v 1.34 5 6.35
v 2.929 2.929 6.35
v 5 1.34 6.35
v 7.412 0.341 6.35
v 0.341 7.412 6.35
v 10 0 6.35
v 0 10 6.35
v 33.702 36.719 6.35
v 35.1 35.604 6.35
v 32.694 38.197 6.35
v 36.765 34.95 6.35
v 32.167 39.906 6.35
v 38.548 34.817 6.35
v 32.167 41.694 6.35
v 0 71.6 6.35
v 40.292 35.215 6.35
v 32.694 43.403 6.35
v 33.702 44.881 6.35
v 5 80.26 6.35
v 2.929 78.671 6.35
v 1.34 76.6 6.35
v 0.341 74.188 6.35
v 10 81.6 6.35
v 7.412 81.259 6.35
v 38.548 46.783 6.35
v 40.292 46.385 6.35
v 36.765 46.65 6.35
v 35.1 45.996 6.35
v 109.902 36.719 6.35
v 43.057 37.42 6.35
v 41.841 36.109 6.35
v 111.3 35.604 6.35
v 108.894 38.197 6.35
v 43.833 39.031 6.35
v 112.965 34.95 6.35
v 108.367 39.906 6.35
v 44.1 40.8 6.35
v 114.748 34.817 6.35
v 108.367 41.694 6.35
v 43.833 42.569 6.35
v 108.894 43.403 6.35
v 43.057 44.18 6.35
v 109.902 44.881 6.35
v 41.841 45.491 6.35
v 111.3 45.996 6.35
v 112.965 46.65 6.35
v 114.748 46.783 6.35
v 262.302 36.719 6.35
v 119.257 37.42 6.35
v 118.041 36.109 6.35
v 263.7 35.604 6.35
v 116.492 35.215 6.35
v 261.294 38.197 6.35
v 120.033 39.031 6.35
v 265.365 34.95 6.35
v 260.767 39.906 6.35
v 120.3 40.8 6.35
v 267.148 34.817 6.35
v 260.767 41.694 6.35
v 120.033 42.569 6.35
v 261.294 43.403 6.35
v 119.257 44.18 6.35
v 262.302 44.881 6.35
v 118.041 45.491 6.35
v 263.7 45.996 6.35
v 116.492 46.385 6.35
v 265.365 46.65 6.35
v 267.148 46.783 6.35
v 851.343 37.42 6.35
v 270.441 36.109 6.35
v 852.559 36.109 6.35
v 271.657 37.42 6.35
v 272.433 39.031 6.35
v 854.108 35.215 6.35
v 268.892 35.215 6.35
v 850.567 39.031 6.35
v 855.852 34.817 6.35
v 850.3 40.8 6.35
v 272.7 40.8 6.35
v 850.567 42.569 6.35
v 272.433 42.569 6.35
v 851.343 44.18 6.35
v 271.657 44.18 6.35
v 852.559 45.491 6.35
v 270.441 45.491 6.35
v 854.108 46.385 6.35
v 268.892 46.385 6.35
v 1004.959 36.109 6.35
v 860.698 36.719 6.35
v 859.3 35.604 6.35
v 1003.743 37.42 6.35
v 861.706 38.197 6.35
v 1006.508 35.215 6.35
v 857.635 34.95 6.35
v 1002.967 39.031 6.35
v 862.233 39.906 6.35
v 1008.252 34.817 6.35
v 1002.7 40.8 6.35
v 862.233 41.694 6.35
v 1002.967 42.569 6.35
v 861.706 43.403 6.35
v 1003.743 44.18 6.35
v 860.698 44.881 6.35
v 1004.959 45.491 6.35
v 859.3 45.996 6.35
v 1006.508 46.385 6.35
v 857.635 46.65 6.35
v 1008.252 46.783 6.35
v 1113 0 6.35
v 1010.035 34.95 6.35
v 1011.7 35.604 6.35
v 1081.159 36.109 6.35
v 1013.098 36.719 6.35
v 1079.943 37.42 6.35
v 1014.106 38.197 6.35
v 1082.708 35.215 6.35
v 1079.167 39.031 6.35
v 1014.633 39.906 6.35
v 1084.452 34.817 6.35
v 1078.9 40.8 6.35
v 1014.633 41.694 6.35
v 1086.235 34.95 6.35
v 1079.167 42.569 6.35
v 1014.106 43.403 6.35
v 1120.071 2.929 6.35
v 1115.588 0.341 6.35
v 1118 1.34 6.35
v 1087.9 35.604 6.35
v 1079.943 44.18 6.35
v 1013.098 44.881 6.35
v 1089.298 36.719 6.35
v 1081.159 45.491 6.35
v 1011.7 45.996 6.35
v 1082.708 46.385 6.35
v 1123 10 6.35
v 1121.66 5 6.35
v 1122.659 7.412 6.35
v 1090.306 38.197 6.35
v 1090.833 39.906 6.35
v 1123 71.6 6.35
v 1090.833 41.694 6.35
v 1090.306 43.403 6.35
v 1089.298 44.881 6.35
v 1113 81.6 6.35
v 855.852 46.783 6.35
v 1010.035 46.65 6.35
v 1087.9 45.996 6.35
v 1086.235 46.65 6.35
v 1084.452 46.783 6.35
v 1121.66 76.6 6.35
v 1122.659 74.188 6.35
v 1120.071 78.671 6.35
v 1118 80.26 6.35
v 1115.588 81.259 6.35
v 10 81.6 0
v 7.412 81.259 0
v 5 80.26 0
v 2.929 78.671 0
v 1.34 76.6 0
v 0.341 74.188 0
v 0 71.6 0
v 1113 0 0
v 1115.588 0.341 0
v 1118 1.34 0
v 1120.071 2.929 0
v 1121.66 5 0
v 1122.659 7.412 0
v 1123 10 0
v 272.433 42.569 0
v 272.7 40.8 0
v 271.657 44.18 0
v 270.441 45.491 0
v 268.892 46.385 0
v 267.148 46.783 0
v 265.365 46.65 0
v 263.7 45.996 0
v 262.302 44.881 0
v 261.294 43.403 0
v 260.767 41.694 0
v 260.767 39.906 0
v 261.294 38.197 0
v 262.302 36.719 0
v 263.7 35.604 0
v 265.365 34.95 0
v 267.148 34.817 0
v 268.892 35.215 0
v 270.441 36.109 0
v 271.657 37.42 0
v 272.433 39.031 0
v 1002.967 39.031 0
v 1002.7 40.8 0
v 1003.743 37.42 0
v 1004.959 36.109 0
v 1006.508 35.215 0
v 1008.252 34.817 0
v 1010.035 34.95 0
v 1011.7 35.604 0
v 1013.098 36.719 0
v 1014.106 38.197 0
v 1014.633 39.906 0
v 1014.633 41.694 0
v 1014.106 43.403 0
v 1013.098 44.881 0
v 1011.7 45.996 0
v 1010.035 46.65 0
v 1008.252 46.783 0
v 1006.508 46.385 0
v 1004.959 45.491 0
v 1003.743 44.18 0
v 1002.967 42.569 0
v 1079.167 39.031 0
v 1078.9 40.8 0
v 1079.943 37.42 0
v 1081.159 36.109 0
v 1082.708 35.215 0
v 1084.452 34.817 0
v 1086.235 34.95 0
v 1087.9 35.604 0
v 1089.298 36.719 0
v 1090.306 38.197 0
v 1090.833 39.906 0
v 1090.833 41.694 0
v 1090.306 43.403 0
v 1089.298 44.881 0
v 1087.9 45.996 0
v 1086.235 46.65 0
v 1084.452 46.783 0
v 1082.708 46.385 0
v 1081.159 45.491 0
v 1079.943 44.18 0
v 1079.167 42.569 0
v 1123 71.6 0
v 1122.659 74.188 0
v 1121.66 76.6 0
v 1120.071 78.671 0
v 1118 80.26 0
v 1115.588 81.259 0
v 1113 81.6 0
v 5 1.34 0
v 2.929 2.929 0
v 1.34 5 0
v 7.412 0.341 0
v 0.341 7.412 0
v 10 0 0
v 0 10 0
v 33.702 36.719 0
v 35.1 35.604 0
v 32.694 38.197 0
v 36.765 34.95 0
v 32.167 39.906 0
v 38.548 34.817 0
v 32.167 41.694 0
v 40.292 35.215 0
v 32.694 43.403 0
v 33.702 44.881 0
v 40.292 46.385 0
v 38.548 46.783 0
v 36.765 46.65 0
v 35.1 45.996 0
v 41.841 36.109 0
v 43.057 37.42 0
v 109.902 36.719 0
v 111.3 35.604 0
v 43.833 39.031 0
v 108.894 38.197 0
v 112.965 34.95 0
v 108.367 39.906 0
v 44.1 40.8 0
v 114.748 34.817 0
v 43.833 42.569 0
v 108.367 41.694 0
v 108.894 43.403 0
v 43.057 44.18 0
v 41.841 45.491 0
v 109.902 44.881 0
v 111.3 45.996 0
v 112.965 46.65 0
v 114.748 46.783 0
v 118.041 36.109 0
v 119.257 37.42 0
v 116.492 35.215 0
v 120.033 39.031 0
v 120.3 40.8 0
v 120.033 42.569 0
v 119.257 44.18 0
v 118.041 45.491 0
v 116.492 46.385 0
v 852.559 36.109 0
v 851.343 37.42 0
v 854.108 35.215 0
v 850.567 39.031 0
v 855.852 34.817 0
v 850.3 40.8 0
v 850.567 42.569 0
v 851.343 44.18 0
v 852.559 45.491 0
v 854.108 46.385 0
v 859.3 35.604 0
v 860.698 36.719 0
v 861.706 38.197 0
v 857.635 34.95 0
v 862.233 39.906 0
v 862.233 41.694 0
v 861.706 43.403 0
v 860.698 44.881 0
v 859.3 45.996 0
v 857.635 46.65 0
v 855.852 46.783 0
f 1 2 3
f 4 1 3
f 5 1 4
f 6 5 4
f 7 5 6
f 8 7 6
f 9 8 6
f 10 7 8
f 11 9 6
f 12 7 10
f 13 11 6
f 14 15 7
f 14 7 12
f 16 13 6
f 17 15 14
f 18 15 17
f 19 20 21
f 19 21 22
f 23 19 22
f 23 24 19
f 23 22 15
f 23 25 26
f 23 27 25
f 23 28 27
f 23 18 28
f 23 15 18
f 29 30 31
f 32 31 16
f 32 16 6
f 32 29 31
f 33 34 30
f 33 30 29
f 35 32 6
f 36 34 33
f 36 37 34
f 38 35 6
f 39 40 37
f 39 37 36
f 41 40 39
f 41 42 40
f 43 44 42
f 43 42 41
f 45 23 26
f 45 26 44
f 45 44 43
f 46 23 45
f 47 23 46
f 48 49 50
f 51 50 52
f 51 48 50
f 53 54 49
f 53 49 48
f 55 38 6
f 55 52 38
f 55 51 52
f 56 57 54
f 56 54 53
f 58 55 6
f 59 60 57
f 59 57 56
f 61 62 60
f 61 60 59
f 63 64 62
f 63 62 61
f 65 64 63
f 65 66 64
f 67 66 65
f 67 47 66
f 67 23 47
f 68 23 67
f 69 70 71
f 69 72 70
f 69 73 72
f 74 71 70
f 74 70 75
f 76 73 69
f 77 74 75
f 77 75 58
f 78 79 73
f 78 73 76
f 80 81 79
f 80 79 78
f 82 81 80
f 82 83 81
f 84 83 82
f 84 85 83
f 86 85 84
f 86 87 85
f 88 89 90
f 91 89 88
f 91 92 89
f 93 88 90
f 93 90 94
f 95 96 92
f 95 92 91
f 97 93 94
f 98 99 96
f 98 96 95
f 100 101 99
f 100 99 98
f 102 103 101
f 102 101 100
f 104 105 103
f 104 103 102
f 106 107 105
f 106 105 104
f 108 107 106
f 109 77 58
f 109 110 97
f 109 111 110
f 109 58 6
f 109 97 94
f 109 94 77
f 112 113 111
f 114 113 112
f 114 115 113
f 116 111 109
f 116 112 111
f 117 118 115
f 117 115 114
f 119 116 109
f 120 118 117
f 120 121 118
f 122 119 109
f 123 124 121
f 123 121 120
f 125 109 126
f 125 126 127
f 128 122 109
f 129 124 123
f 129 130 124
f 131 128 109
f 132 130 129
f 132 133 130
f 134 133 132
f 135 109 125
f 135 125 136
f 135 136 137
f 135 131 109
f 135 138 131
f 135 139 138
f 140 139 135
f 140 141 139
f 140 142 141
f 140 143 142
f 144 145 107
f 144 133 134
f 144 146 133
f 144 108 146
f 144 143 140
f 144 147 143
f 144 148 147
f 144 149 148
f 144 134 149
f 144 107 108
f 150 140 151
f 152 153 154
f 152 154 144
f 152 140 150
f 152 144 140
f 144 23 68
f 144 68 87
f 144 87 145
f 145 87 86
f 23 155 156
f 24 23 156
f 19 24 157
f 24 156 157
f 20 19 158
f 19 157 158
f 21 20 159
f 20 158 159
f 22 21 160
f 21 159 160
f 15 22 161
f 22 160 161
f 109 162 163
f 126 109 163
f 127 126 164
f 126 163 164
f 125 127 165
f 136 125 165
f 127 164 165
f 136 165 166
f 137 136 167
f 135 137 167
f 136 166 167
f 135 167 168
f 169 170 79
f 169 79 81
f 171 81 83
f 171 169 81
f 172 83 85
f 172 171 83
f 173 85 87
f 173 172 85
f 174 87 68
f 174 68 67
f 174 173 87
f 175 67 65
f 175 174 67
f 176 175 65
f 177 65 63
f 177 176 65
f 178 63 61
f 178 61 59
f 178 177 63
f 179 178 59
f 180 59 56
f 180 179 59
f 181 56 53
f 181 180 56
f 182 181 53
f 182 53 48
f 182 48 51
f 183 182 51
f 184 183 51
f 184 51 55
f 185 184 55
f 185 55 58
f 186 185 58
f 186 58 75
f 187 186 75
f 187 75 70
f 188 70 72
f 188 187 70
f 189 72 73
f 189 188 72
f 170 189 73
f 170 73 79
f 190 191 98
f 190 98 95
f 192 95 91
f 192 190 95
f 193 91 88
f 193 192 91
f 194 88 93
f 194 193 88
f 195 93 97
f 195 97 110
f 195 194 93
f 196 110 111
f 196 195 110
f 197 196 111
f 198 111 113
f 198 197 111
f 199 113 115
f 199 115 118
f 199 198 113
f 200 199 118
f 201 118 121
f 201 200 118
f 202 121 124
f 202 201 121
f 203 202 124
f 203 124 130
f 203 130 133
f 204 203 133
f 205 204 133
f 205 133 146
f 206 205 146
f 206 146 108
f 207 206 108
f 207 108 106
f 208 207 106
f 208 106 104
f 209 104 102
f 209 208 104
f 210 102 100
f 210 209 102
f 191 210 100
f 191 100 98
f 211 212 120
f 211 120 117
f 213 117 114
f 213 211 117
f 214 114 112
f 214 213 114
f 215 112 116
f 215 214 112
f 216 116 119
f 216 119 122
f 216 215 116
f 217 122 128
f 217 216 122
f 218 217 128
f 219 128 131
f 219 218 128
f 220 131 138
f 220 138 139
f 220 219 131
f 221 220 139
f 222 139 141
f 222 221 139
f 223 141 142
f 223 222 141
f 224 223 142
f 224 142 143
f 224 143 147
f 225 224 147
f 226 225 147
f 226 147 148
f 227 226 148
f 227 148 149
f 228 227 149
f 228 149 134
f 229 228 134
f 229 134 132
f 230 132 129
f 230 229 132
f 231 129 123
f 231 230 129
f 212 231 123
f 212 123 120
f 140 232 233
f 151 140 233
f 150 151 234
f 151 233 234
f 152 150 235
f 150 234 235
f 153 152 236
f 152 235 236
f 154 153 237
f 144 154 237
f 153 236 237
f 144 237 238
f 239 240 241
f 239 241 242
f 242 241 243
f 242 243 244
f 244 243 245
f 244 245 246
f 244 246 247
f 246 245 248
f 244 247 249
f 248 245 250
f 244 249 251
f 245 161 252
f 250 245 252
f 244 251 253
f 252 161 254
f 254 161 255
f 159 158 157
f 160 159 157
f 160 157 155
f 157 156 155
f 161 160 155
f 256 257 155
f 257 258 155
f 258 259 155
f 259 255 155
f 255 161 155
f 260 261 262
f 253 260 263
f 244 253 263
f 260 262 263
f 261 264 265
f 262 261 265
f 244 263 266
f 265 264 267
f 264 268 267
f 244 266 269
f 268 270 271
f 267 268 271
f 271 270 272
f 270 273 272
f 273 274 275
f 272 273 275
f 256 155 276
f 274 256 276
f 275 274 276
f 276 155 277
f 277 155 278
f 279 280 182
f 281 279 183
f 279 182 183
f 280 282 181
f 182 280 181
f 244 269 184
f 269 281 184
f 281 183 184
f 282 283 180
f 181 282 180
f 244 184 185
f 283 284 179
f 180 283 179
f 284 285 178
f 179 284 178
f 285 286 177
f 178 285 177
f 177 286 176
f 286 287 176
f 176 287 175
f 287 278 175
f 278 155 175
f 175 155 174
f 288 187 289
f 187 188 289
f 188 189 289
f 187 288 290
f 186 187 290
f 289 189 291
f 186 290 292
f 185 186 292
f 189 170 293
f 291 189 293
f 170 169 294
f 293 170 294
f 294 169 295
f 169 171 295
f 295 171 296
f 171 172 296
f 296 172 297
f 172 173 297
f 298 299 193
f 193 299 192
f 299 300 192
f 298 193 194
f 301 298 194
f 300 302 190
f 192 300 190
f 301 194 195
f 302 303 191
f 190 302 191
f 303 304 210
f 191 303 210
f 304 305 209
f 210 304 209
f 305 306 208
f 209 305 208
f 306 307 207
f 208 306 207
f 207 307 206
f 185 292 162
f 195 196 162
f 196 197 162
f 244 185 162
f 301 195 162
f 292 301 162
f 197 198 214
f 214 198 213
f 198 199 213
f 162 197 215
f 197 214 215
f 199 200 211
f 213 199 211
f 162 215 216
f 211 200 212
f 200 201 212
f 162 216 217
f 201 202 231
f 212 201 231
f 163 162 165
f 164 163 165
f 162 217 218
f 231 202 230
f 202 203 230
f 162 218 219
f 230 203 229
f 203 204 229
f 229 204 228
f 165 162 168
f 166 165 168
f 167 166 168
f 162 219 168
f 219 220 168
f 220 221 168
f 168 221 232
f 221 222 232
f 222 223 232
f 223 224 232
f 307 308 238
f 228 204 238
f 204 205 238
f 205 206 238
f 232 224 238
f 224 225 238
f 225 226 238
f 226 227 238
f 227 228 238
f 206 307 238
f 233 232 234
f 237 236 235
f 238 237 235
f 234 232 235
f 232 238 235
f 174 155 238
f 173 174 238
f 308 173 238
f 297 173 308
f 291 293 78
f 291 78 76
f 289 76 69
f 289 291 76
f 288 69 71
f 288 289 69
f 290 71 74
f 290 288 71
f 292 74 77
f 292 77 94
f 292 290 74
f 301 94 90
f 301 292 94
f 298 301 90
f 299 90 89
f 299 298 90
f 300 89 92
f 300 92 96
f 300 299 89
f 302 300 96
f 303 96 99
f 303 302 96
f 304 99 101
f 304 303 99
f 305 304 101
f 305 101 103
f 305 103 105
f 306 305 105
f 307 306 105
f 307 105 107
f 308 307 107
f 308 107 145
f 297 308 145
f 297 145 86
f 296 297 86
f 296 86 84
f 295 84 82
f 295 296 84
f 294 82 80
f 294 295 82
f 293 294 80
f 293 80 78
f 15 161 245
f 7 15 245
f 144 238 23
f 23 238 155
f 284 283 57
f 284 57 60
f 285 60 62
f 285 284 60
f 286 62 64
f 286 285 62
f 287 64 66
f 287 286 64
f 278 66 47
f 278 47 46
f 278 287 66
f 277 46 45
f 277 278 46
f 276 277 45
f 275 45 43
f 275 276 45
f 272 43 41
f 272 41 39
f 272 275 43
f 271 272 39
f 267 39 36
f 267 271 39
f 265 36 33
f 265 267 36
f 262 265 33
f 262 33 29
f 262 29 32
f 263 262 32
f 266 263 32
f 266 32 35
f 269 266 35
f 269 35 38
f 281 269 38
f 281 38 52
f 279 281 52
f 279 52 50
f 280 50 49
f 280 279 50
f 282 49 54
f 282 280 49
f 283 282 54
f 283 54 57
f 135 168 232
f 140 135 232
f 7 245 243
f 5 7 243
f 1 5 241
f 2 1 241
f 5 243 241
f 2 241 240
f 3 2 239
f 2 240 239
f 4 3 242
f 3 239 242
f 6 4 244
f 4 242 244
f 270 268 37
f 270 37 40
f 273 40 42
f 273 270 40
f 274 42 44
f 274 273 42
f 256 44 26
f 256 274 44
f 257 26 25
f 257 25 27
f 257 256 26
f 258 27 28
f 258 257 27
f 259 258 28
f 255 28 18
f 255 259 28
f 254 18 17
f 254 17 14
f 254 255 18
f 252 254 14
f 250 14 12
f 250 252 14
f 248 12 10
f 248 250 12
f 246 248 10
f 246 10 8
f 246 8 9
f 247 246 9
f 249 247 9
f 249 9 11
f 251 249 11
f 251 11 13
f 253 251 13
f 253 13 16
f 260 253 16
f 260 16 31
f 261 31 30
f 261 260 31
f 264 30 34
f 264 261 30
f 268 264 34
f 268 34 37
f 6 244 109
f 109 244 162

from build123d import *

# Parameters (mm, degrees)
SKETCH1_R           = 6
BOSS_EXTRUDE1_DEPTH = 6.35


with BuildPart() as part:
    # Sketch1 → Boss-Extrude1 (new body)
    with BuildSketch(Plane.XY):
        with BuildLine():
            Line((10, 0), (1113, 0))
            ThreePointArc((1113, 0), (1120.071067812, 2.928932188), (1123, 10))
            Line((1123, 10), (1123, 71.6))
            ThreePointArc((1123, 71.6), (1120.071067812, 78.671067812), (1113, 81.6))
            Line((1113, 81.6), (10, 81.6))
            ThreePointArc((10, 81.6), (2.928932188, 78.671067812), (0, 71.6))
            Line((0, 71.6), (0, 10))
            ThreePointArc((0, 10), (2.928932188, 2.928932188), (10, 0))
        make_face()
        with Locations((38.1, 40.8)):
            Circle(SKETCH1_R, mode=Mode.SUBTRACT)
        with Locations((114.3, 40.8)):
            Circle(SKETCH1_R, mode=Mode.SUBTRACT)
        with Locations((266.7, 40.8)):
            Circle(SKETCH1_R, mode=Mode.SUBTRACT)
        with Locations(Location((856.3, 40.8, 0), (0, 0, 180))):
            Circle(SKETCH1_R, mode=Mode.SUBTRACT)
        with Locations(Location((1008.7, 40.8, 0), (0, 0, 180))):
            Circle(SKETCH1_R, mode=Mode.SUBTRACT)
        with Locations(Location((1084.9, 40.8, 0), (0, 0, 180))):
            Circle(SKETCH1_R, mode=Mode.SUBTRACT)
    extrude(amount=BOSS_EXTRUDE1_DEPTH)


solid = part.part
